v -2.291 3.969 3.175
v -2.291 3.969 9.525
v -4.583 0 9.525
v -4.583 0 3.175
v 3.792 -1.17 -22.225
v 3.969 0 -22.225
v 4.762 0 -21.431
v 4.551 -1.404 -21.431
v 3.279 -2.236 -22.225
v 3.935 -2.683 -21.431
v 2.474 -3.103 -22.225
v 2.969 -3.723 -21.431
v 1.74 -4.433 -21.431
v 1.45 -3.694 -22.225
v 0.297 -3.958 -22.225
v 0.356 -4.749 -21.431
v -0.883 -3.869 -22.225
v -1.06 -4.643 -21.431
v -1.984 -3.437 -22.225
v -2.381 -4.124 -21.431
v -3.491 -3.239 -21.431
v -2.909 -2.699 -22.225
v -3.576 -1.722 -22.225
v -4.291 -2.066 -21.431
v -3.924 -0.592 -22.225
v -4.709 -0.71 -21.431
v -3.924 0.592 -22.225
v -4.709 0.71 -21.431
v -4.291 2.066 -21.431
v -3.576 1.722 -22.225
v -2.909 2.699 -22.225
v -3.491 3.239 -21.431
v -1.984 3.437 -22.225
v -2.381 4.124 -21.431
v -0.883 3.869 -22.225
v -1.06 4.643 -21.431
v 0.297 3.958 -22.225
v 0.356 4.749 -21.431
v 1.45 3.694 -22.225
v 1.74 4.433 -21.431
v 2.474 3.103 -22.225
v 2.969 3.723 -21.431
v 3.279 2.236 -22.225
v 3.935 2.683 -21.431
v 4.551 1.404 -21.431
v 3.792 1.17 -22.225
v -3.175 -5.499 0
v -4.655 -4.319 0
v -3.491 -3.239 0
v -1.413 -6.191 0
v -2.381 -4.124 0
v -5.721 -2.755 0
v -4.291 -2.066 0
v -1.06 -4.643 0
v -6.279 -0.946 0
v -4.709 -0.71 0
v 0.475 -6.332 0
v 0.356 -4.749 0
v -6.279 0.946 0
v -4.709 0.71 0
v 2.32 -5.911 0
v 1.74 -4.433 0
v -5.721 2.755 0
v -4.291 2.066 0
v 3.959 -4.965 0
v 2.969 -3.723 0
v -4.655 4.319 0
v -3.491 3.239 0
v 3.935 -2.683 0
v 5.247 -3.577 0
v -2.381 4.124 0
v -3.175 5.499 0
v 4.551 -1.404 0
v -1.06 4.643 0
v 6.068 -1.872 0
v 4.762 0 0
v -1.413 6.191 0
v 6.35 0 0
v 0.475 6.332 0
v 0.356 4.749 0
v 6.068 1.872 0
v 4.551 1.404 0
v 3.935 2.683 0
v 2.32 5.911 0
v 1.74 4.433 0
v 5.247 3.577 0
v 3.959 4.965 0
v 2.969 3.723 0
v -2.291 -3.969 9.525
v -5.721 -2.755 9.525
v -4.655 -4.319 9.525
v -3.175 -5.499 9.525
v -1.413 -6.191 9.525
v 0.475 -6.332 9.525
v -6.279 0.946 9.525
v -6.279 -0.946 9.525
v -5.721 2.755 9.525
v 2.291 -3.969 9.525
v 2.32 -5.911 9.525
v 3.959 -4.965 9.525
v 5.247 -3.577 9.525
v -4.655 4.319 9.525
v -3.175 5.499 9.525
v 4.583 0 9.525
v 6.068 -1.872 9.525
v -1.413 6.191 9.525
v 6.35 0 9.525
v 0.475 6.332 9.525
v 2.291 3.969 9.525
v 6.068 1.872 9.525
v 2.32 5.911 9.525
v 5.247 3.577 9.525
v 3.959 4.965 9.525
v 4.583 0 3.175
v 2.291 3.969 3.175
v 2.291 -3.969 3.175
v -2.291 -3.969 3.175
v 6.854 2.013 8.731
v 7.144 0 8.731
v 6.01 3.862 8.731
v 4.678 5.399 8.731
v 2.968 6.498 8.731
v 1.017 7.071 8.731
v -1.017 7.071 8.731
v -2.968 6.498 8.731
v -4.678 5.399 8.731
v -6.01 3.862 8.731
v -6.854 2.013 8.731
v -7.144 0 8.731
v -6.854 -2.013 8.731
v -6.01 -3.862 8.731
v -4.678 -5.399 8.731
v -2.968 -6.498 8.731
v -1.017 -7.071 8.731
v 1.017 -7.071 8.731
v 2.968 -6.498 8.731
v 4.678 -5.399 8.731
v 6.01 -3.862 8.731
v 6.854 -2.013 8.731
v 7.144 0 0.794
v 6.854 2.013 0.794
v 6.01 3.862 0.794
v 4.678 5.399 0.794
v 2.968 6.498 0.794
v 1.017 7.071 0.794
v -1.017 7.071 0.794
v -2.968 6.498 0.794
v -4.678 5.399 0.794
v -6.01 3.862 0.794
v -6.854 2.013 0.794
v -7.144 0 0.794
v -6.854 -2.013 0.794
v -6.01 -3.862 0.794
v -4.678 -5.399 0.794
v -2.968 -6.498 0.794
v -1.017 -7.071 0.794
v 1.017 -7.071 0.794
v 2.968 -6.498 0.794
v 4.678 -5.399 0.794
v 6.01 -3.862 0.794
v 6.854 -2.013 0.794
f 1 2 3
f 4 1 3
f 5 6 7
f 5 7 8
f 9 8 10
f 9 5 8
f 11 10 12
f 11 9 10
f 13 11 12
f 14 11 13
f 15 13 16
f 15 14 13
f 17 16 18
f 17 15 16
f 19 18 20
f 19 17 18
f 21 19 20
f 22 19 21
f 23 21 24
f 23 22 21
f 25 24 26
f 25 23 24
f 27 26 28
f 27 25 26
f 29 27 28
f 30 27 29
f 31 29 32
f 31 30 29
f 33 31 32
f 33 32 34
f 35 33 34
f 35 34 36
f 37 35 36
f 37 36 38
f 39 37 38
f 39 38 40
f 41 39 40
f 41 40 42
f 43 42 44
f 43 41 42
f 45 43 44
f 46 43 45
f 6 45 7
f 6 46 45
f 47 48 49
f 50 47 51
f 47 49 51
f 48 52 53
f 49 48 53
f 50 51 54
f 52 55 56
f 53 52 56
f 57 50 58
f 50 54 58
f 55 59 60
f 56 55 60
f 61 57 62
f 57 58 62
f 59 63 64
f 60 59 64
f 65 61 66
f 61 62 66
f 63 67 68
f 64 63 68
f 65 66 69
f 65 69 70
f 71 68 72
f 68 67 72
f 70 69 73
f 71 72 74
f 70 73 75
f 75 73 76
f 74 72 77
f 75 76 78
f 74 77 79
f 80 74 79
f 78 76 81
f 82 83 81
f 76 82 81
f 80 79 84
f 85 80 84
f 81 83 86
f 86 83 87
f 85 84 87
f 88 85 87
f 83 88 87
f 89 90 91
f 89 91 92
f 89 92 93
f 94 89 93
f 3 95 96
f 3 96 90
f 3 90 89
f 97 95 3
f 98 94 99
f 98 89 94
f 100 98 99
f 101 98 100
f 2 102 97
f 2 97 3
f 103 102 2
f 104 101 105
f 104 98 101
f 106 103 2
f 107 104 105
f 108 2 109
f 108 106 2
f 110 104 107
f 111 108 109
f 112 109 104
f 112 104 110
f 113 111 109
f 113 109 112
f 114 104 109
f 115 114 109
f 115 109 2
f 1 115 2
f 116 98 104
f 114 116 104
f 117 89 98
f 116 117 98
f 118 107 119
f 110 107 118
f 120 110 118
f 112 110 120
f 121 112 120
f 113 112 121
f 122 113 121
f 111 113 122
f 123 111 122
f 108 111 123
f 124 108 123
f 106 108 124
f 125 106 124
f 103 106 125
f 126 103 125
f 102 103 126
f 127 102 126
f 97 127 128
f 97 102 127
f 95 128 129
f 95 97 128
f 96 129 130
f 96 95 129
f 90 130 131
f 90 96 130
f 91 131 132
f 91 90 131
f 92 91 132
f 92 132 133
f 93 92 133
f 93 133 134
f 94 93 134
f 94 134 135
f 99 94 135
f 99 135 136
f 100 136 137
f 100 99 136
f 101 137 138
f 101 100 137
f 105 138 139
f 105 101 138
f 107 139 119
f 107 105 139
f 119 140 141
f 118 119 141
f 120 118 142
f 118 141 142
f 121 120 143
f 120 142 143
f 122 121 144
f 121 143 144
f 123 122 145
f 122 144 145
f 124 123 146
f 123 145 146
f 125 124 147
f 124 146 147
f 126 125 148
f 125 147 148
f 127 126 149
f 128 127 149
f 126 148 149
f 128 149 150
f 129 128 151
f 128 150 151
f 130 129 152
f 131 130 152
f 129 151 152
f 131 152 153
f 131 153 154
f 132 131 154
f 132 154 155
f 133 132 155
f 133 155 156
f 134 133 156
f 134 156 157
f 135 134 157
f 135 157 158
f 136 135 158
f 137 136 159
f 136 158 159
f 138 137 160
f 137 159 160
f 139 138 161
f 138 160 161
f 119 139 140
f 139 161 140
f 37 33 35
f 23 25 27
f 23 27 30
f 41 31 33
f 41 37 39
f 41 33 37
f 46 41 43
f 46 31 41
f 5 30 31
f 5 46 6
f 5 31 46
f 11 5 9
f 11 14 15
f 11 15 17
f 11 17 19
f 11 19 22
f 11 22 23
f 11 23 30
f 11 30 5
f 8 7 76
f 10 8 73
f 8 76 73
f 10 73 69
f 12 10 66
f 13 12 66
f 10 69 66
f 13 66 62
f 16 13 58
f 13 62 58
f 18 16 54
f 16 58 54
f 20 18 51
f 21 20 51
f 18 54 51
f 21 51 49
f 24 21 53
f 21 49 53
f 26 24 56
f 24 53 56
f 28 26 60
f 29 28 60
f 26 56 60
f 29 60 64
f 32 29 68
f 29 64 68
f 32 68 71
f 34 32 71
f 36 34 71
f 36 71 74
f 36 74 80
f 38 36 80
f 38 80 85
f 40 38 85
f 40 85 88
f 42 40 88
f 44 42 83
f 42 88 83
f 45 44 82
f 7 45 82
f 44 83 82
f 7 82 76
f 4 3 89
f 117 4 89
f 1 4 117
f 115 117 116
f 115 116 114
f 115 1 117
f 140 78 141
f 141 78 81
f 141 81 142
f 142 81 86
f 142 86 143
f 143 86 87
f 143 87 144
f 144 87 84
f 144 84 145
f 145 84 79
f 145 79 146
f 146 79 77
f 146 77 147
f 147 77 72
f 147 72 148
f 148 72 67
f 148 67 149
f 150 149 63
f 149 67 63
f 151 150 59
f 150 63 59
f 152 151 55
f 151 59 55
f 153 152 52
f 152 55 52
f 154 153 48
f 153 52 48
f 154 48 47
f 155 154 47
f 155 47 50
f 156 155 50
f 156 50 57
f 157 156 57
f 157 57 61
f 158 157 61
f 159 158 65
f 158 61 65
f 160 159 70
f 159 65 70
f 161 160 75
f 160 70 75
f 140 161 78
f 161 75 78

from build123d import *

# Parameters (mm, degrees)
F0_R     = 7.14375
F1_DEPTH = 9.525
F3_DEPTH = 6.35
F4_R     = 4.7625
F5_DEPTH = 22.225
F6_SIZE  = 0.79375
F7_SIZE  = 0.79375
F8_SIZE  = 0.79375


with BuildPart() as f1:
    # F0 (on Top) → F1 (new body)
    with BuildSketch(Plane.XY):
        Circle(F0_R)
    extrude(amount=F1_DEPTH)

    # F2 (on face) → F3 (cut)
    with BuildSketch(Plane.XY.offset(9.525)):
        Polygon((2.291359, 3.96875), (-2.291359, 3.96875), (-4.582718, 0), (-2.291359, -3.96875), (2.291359, -3.96875), (4.582718, 0), align=None)
    extrude(amount=-F3_DEPTH, mode=Mode.SUBTRACT)

    # F4 (on face) → F5 (join)
    with BuildSketch(Plane(origin=(0, 0, 0), x_dir=(1, 0, 0), z_dir=(0, 0, -1))):
        Circle(F4_R)
    extrude(amount=F5_DEPTH)

    # F6
    f6_edges = [f1.edges().sort_by_distance(p)[0] for p in [
        (-7.14375, 0, 9.525),
    ]]
    chamfer(f6_edges, length=F6_SIZE)

    # F7
    f7_edges = [f1.edges().sort_by_distance(p)[0] for p in [
        (-7.14375, 0, 0),
    ]]
    chamfer(f7_edges, length=F7_SIZE)

    # F8
    f8_edges = [f1.edges().sort_by_distance(p)[0] for p in [
        (-4.7625, 0, -22.225),
    ]]
    chamfer(f8_edges, length=F8_SIZE)


solid = f1.part
